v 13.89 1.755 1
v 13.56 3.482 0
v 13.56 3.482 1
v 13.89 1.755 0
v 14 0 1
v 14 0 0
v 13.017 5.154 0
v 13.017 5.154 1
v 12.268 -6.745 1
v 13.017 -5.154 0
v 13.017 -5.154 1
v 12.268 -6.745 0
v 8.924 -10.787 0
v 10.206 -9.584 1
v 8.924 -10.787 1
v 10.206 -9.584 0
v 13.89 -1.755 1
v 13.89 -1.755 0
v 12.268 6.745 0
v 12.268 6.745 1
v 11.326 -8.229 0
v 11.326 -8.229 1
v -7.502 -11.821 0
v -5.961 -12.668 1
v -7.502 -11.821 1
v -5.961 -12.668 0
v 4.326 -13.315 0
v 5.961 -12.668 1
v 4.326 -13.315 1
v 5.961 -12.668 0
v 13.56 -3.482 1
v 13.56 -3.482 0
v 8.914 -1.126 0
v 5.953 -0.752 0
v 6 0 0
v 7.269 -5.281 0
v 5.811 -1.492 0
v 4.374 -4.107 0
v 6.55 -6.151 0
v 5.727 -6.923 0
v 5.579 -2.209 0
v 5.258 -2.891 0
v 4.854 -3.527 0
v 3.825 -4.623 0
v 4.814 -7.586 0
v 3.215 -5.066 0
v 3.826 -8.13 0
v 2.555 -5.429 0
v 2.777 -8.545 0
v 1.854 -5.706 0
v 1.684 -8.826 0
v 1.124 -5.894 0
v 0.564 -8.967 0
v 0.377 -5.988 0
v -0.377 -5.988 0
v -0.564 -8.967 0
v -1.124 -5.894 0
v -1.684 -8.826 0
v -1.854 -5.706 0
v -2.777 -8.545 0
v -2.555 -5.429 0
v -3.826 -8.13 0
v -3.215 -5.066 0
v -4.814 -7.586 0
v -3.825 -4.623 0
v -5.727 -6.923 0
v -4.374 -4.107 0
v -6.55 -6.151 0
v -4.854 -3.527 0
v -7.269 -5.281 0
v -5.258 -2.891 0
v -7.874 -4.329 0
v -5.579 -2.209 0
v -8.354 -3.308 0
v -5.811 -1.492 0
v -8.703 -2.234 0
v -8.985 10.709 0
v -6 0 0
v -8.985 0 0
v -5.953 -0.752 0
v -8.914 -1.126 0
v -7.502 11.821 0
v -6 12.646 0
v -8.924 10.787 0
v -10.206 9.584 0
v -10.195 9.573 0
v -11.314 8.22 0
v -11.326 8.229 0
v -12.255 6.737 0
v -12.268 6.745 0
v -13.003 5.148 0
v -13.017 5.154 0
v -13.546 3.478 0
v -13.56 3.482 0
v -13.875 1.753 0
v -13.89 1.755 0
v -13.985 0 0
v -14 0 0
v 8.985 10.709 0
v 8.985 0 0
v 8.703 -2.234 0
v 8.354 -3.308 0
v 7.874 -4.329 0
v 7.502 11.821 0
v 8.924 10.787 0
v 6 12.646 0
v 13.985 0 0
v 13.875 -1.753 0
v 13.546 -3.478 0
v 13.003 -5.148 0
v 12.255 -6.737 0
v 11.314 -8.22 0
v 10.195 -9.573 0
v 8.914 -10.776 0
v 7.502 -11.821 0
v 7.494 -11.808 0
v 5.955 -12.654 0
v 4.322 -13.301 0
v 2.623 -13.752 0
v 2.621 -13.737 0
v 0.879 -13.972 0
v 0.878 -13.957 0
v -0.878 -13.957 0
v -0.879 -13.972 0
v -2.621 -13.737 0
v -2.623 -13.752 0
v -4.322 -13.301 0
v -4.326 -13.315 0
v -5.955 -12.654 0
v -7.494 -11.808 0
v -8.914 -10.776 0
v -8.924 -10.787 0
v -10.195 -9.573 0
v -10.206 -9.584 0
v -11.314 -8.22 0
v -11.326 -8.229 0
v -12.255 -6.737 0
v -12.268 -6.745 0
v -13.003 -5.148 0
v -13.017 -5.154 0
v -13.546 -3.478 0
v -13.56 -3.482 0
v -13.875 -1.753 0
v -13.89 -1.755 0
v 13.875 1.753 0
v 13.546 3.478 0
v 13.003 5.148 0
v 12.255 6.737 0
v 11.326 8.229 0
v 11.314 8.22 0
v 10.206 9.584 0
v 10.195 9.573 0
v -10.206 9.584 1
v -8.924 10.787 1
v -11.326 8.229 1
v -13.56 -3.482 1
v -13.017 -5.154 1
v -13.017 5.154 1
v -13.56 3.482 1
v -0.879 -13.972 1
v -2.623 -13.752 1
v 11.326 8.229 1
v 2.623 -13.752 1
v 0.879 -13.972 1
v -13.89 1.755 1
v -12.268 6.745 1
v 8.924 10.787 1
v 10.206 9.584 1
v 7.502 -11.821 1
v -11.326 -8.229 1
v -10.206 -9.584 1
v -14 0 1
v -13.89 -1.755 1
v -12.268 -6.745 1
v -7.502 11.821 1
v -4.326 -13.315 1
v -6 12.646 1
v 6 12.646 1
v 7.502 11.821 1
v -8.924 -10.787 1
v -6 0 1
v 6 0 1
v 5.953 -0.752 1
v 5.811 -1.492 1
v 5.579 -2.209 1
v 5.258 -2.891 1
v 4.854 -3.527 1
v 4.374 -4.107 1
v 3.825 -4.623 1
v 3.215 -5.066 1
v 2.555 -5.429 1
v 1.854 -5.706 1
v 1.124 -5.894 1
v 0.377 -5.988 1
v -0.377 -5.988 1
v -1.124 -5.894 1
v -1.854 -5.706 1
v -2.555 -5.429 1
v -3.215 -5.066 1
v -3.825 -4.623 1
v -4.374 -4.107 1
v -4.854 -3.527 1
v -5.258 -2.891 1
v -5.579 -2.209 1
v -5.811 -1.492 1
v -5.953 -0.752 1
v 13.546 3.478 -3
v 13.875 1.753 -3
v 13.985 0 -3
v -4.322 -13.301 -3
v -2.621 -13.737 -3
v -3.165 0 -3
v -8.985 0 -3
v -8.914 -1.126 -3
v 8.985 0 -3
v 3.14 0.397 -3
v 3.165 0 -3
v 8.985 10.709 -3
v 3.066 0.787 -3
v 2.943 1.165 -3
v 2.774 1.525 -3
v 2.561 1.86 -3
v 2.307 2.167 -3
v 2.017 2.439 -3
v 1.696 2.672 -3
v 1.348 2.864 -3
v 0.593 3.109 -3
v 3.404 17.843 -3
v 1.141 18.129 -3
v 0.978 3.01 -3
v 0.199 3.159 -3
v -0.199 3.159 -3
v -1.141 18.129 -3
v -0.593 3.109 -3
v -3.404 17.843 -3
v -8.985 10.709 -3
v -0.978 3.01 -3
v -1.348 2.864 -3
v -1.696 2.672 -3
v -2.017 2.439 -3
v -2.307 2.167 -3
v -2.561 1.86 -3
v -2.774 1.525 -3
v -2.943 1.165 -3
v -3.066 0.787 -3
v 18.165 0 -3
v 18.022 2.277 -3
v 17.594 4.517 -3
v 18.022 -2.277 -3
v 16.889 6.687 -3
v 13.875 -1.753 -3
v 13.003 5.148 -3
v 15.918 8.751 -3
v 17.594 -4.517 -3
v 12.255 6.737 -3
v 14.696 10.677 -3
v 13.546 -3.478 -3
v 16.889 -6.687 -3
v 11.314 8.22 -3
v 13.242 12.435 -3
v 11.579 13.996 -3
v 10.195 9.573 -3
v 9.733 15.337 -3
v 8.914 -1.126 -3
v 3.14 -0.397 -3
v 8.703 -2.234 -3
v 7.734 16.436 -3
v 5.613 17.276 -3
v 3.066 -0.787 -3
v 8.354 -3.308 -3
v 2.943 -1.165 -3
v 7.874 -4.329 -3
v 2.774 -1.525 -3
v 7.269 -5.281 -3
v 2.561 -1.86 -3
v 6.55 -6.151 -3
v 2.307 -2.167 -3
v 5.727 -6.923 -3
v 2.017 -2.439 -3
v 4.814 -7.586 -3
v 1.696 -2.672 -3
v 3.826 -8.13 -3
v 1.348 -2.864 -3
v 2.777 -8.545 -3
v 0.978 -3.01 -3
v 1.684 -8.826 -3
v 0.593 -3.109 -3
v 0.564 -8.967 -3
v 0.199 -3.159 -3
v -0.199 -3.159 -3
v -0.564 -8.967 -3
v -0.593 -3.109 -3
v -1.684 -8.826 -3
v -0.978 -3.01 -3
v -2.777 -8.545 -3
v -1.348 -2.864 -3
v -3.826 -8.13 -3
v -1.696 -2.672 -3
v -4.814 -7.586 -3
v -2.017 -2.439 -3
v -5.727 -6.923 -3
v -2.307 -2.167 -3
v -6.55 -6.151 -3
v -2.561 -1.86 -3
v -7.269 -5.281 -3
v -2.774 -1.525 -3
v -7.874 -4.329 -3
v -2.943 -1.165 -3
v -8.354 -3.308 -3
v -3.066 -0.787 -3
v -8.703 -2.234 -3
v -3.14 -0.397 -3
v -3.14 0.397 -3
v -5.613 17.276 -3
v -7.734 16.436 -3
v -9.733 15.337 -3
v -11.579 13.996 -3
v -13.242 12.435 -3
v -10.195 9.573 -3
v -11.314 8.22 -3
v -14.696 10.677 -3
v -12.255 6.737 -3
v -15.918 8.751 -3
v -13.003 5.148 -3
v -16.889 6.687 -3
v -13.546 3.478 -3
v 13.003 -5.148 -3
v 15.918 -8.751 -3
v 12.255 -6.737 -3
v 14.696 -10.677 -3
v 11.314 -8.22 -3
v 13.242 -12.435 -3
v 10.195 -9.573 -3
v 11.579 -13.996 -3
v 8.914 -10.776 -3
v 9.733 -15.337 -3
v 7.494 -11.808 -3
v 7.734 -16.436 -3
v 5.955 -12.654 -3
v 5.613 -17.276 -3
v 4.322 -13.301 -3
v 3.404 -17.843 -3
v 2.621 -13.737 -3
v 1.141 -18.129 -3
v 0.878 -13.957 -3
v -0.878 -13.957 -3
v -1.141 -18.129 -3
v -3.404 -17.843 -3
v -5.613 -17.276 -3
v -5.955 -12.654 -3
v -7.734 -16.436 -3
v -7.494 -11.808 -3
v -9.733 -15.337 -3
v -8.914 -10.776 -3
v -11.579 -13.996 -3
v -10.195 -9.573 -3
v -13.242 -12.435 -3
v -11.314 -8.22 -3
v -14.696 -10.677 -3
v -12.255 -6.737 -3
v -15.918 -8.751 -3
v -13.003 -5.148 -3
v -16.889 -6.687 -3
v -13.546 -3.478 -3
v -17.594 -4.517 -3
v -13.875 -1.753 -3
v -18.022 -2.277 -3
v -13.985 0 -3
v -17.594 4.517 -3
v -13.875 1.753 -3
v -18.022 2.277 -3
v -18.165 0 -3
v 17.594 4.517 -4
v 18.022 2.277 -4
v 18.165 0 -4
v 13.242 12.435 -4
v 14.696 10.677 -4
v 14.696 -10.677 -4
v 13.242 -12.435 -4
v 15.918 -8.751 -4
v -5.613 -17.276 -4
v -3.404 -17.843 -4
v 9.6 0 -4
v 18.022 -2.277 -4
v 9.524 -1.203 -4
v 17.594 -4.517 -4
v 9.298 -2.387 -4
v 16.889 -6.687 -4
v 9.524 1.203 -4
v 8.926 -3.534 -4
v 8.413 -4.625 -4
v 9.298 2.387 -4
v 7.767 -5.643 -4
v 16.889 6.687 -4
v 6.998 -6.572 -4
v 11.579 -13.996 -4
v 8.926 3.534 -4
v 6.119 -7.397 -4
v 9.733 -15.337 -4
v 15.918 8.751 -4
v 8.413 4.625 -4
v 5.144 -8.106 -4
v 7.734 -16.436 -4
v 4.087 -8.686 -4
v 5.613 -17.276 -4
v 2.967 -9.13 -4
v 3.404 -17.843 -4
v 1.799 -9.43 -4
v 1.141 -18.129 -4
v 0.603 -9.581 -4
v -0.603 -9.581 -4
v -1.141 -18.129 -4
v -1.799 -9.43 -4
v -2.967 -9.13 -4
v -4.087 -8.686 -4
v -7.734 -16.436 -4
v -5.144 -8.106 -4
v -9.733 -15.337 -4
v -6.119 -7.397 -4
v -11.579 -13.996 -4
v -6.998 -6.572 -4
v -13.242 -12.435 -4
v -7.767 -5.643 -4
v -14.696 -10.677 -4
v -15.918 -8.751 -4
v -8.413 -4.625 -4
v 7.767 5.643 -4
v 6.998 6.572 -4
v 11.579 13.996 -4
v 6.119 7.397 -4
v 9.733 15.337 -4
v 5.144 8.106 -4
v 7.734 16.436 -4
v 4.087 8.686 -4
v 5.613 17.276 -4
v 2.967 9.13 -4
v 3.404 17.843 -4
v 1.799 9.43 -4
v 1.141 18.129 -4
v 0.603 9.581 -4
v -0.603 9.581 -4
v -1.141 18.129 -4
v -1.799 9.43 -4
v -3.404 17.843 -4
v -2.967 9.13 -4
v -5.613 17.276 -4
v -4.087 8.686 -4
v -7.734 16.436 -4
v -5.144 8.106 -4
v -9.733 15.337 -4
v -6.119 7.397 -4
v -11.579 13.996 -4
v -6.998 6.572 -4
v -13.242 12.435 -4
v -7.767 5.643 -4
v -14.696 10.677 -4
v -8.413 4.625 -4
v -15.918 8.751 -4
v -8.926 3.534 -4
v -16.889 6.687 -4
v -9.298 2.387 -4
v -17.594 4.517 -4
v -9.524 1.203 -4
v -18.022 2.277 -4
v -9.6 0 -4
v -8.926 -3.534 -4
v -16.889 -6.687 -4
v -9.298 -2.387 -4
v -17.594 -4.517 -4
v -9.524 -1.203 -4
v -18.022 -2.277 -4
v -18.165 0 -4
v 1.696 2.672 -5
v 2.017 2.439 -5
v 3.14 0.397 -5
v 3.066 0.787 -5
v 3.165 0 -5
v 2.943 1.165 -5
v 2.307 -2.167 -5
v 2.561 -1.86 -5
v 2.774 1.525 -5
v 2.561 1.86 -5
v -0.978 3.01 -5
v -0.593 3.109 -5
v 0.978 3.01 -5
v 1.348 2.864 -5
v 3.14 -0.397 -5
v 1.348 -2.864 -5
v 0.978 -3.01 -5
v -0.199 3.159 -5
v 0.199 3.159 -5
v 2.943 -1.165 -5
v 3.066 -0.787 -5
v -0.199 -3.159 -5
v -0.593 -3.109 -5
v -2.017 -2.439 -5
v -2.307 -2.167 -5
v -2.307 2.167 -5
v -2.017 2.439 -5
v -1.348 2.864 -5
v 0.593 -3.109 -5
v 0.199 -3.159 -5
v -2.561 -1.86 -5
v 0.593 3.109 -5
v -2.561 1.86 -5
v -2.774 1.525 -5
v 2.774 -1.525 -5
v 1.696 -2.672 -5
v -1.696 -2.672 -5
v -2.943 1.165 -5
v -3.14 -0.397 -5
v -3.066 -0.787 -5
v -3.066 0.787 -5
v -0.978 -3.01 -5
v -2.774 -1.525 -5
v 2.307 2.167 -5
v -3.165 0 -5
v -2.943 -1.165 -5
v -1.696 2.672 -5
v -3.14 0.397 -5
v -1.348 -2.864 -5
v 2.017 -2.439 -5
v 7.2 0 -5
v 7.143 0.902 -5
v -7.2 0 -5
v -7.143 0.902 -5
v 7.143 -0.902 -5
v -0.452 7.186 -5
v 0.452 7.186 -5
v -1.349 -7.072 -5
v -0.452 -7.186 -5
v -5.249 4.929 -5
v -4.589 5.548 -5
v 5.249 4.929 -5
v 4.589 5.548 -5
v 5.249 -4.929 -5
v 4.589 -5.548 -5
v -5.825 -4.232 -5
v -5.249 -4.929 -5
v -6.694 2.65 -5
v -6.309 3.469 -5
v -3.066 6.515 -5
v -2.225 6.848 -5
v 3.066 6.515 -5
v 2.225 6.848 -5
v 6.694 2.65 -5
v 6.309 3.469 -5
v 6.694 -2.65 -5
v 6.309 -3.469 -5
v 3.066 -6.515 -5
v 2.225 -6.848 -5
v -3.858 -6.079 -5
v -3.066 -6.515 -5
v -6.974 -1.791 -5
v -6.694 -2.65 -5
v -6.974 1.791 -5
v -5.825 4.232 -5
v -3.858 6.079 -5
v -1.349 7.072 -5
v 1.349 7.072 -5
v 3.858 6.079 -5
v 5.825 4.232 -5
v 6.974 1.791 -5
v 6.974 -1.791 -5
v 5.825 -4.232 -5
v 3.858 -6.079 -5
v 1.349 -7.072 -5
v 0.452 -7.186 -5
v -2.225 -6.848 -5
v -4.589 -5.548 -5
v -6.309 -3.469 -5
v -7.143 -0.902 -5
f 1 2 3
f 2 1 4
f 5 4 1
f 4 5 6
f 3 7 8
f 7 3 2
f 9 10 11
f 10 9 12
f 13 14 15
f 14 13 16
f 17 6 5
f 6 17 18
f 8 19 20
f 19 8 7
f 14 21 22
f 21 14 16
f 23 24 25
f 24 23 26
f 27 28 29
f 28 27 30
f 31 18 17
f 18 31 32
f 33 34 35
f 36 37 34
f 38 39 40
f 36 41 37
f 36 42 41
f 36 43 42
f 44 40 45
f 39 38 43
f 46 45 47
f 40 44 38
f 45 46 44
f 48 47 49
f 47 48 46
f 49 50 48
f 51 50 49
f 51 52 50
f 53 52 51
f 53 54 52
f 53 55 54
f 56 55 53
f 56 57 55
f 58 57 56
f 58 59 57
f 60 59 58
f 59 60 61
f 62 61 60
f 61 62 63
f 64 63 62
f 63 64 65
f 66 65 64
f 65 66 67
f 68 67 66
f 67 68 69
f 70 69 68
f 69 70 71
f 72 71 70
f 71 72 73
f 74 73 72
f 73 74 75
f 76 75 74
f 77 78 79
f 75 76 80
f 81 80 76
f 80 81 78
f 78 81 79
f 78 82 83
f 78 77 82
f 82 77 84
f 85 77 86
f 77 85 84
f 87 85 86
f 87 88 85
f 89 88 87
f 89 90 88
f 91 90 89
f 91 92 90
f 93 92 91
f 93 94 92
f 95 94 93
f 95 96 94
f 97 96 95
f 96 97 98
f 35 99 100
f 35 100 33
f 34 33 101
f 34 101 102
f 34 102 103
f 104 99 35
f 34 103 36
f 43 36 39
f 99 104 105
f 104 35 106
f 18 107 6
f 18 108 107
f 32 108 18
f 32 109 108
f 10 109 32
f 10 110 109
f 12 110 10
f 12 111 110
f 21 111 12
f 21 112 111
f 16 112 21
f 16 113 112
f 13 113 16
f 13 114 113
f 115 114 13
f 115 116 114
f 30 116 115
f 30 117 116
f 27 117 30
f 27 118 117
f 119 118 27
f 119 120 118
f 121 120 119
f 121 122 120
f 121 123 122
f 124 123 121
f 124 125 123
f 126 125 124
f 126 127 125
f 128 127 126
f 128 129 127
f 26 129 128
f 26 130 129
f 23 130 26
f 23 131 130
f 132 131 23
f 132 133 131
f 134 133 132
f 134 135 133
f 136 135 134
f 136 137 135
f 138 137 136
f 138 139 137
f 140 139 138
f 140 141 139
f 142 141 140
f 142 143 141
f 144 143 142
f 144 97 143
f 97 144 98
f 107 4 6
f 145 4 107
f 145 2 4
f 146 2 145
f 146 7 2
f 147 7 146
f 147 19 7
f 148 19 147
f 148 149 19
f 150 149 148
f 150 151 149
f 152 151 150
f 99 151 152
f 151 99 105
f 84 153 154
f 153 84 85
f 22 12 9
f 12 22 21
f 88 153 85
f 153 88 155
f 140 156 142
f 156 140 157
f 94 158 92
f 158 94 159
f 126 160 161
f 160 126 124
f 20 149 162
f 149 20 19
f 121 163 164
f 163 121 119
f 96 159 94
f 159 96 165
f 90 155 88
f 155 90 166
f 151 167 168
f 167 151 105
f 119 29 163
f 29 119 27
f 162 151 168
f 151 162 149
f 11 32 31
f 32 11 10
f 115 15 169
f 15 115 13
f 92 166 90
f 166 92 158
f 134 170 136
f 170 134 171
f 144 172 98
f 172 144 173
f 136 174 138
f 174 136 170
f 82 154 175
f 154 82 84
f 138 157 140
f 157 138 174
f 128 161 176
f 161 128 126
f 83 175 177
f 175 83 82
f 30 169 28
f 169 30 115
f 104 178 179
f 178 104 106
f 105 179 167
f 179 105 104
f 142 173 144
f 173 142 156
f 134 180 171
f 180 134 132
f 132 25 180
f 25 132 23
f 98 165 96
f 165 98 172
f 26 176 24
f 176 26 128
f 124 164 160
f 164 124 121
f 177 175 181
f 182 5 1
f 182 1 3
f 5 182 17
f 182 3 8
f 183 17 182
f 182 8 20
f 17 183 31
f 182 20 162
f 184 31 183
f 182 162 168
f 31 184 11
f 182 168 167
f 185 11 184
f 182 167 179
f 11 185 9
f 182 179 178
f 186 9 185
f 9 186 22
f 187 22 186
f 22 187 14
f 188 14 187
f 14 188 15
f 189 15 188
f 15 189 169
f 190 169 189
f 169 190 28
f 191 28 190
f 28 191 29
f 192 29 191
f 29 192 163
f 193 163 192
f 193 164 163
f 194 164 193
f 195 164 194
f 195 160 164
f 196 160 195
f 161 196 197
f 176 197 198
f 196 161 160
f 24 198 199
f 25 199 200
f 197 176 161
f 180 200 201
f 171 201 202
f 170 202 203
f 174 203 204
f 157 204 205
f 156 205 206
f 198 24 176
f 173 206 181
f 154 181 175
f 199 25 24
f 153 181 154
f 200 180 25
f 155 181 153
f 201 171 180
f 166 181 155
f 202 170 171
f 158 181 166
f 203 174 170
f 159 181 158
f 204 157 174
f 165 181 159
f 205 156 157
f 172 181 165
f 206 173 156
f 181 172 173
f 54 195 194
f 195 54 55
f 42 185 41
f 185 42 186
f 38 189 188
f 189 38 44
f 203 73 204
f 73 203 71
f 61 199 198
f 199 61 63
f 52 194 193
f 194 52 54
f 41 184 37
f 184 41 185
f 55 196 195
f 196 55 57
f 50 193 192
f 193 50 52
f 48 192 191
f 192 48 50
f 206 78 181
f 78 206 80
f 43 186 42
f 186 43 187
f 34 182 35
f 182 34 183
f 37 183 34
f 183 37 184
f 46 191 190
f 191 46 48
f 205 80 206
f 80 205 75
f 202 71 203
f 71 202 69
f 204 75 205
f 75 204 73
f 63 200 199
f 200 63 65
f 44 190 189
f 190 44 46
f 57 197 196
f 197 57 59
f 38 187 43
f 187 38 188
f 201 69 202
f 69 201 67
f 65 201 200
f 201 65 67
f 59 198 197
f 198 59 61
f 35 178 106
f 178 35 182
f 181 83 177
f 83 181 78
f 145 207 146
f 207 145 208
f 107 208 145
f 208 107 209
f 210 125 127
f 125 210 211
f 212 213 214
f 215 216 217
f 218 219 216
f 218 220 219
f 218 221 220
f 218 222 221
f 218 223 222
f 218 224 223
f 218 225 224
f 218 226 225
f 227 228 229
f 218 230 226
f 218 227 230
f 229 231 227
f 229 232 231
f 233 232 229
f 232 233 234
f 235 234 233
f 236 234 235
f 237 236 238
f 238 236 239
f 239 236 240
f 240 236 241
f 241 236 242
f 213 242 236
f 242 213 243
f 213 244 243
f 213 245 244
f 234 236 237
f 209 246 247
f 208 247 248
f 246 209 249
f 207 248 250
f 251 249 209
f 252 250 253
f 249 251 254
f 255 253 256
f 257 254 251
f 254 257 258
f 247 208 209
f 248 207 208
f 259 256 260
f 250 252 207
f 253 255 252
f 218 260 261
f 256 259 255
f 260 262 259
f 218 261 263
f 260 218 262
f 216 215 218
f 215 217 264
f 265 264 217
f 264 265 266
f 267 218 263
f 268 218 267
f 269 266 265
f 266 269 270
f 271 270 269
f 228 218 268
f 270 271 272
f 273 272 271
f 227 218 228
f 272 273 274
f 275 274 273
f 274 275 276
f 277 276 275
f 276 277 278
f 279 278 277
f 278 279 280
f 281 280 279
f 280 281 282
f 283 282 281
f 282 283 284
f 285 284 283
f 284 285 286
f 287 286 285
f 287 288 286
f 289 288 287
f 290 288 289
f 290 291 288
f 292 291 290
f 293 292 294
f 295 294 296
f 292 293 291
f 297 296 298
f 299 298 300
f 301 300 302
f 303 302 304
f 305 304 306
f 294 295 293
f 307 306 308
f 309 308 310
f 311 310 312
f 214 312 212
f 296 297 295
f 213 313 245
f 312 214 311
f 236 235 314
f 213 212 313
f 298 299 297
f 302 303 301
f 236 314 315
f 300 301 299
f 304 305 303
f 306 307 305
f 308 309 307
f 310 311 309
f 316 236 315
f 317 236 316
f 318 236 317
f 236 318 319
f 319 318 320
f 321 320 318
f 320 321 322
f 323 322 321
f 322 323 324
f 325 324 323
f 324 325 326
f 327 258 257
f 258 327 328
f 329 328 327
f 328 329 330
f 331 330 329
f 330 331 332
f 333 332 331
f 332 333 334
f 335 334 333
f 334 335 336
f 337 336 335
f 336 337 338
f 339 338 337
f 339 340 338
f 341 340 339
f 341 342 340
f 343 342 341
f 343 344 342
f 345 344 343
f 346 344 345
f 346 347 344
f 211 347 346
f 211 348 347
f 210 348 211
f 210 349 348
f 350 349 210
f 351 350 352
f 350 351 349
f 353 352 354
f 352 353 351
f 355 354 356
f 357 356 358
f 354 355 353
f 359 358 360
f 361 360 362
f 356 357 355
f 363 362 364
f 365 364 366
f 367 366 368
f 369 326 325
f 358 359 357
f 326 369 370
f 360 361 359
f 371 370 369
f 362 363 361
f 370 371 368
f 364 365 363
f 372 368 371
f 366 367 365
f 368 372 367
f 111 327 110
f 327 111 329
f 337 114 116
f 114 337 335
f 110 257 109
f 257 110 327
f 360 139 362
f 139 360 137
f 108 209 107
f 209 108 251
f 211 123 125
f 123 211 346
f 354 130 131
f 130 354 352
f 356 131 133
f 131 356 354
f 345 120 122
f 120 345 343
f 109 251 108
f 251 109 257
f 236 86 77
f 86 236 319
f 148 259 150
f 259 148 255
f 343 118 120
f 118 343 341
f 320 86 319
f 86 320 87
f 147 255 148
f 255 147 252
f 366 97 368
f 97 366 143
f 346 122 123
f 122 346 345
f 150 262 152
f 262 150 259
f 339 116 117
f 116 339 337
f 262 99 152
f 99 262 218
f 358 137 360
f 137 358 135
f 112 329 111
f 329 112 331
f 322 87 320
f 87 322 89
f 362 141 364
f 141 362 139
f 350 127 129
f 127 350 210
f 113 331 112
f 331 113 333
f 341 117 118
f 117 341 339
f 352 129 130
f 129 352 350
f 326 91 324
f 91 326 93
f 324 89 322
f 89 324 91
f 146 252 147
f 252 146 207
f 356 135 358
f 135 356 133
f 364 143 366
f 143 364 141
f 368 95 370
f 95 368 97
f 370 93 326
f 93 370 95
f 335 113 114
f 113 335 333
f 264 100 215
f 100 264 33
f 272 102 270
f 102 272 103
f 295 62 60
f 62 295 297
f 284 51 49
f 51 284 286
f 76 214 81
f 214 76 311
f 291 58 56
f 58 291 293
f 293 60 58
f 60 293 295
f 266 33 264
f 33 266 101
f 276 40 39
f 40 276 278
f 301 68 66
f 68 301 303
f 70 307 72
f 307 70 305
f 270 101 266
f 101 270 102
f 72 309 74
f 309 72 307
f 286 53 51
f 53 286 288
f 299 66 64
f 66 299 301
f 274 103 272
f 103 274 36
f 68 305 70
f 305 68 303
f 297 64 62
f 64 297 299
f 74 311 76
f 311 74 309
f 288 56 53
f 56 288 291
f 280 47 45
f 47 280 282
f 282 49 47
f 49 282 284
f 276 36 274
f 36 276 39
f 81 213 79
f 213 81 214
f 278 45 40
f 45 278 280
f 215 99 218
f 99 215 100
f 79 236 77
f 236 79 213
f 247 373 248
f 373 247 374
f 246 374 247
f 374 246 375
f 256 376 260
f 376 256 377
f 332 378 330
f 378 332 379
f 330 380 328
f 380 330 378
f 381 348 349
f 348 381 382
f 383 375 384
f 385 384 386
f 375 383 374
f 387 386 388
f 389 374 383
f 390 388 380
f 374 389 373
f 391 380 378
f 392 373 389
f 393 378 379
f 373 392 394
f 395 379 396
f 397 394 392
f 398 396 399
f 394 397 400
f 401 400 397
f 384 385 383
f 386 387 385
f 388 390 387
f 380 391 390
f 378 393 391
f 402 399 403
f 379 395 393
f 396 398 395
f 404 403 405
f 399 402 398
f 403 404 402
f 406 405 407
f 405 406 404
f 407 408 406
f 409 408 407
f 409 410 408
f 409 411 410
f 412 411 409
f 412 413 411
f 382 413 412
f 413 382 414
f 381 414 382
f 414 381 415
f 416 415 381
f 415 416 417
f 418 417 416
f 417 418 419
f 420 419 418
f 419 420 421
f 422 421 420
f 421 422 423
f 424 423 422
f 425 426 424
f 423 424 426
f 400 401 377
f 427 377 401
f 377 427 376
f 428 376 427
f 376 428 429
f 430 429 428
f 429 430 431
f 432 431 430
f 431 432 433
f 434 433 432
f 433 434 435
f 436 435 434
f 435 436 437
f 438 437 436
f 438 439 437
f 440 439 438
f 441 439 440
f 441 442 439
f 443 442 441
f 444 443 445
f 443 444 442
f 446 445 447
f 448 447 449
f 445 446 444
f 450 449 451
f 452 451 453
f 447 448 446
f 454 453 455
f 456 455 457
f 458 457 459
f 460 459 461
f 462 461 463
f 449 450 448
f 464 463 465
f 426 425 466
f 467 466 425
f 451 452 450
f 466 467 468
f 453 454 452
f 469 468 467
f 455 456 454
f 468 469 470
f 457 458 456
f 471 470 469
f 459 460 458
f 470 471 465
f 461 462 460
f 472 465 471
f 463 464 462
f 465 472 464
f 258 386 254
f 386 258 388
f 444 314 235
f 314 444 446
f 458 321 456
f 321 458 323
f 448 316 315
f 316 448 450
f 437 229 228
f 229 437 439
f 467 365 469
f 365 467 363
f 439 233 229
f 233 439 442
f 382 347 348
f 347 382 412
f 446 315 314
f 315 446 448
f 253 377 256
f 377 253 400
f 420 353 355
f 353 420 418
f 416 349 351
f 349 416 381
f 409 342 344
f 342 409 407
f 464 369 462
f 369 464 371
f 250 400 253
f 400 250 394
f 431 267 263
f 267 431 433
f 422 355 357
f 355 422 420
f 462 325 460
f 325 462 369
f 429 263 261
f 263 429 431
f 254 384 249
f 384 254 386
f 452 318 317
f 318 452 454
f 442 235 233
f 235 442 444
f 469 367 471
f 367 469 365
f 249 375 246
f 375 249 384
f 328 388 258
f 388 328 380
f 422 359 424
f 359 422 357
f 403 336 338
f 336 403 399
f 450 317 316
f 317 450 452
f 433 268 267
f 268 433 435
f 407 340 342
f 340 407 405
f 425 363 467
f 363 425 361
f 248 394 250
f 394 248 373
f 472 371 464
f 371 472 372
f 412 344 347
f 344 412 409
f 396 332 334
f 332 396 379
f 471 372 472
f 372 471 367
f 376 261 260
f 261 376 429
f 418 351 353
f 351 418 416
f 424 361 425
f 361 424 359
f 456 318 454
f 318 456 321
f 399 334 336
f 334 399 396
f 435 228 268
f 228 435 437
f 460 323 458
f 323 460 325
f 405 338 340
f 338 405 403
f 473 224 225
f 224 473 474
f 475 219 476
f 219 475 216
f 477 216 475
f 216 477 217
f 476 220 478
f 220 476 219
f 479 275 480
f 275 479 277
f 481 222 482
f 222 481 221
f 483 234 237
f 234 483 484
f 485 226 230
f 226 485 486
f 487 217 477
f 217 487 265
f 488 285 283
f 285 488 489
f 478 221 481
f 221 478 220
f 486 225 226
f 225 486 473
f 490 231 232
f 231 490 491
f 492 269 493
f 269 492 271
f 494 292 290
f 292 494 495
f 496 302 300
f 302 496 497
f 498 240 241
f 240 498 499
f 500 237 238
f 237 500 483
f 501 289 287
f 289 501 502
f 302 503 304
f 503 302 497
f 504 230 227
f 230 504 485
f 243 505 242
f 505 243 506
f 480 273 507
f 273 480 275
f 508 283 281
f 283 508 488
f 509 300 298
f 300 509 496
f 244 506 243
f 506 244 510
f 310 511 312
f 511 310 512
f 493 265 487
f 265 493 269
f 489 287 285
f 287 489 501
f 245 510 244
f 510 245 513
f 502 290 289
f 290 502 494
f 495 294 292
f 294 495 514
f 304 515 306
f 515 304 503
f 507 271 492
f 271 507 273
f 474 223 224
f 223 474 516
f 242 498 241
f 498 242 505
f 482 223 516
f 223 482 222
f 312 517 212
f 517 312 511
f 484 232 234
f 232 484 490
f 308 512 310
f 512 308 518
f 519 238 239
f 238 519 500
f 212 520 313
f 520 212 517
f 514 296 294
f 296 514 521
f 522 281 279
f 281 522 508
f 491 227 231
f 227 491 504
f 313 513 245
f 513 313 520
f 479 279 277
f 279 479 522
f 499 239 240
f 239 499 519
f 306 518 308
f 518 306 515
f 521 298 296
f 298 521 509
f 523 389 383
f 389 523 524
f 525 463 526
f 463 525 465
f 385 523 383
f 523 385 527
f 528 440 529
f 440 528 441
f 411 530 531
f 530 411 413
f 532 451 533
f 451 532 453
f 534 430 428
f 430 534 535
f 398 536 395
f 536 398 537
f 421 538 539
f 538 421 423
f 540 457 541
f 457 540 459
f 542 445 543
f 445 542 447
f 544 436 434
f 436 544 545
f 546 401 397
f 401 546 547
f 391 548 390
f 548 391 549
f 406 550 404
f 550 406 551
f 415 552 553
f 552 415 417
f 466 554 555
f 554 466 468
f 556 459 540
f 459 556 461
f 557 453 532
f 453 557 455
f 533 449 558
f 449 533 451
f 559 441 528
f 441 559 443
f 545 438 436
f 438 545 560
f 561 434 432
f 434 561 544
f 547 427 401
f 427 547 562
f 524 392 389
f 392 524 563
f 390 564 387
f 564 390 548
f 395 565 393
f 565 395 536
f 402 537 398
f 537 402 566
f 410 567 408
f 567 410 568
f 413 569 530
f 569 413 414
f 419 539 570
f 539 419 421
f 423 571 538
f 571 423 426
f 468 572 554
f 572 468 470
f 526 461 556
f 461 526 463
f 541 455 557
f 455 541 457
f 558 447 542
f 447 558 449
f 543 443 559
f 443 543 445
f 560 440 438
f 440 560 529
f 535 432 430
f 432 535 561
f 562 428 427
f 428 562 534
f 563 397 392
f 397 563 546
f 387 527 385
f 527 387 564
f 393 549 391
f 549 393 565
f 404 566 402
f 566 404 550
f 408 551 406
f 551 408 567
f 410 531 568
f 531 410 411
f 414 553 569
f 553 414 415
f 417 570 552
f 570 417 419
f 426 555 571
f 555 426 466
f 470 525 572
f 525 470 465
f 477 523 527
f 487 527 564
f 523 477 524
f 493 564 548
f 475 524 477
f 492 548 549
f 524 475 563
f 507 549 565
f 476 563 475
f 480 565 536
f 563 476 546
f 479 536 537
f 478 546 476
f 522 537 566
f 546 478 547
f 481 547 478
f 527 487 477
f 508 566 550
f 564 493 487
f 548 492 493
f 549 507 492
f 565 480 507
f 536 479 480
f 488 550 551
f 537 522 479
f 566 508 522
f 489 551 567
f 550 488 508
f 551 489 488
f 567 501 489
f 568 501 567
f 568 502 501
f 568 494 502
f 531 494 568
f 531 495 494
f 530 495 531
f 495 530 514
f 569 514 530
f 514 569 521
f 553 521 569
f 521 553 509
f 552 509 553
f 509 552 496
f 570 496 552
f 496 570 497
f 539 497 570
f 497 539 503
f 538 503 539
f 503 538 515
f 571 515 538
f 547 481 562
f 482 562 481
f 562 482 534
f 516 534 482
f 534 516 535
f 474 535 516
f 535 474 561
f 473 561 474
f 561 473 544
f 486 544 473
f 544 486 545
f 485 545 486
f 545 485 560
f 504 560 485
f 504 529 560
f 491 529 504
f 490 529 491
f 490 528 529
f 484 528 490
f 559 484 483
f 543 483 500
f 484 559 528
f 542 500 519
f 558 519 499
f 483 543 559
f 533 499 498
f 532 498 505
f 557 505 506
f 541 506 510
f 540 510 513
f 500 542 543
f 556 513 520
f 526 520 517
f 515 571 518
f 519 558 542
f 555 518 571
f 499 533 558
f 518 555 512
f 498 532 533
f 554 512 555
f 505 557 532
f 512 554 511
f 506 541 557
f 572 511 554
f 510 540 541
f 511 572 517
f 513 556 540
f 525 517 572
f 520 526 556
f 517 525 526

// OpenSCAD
// file: manifold_parts.scad
module tube(height, radius, wall){
  difference(){
    cylinder(h=height, r=radius + wall);
    translate([0, 0, -1])
    cylinder(h=height+2, r=radius);
  }		
}

module washer(or, ir, h){
  tube(h, ir, or-ir);
}

module elb(radius, wall){
  d = 2 * (radius + wall);
  difference(){
    tube(sqrt(2) * (d), radius, wall);
    translate([radius + wall, -d, 0])rotate(45, [0, -1, 0])cube([d, 2*d, 2*d]);
  }
}

module elbow(radius, wall){
  union(){
    elb(radius, wall);
    translate([radius+wall, 0, radius + wall])
      rotate(90, [0, -1, 0])
      rotate(180, [0, 0, 1])
      elb(radius, wall);
  }
}

module tee(r1, r2, wall){
  difference(){
    union(){
      cylinder(h=(r2 + wall), r=r1+wall);
      translate([(r1 + wall), 0, (r2 + wall)])
	rotate(90, [0, -1, 0])
	cylinder(h=2*(r1 + wall), r=r2+wall);
    }
    translate([0, 0, -1])
    cylinder(h=(r2 + wall)+2, r=r1);
    translate([(r1 + wall), 0, (r2 + wall)])
      rotate(90, [0, -1, 0])
      translate([0, 0, -1])
      cylinder(h=2*(r1 + wall)+1, r=r2);
  }
}

module taper(r1, r2, h, wall){
  difference(){
    cylinder(r1=r1+wall, r2=r2+wall, h=h);
    cylinder(r1=r1, r2=r2, h=h);
  }
}

module eks(r1, r2, wall){
  difference(){
    union(){
      cylinder(h=2*(r2 + wall), r=r1+wall);
      translate([(r1 + wall), 0, (r2 + wall)])

	rotate(90, [0, -1, 0])
	cylinder(h=2*(r1 + wall), r=r2+wall);
    }
    cylinder(h=2*(r2 + wall), r=r1);
    translate([(r1 + wall), 0, (r2 + wall)])
    rotate(90, [0, -1, 0])
      cylinder(h=2*(r1 + wall), r=r2);
  }
}

/*
  r1 -- main tube inside radius 
  r2 -- fattest part barb inside radius
  h1 -- total height
  h2 -- height of barb
  h3 -- offset from top to start of barb
 */
module barb(r1, r2, h1, h2, h3, wall){
  union(){
    tube(h1, r1, wall);
    translate([0, 0, h1 - h2 - h3])
      taper(r2, r1, h2, wall);
  }
}
// main file
include <manifold_parts.scad>

$fn = 50;

scale = 1.;
inch = 25.4 * scale;
mm = 1. * scale;
wall = .05 * inch;
radius = .5*inch;
or = wall + radius;
gap = .25*inch;
gap = 0.02 * inch;
/*tee(radius * .5, radius, wall);*/

w=1.4*mm;
chuck_thickness = 0.6*inch;
cuff_clearance = 5*mm;

// female
/*
translate([0, 0*.5*inch, .8*inch-3*mm])
scale(1/scale){
  difference(){
    tube(7*mm, 1*mm, w); // manifold-connect
    translate([0, 0, 6.25*mm])
    difference(){
      cylinder(h=1*mm + w, r1=1.1*mm + w, r2=1.1*mm+w);
      translate([0,0,-1*mm])
	cylinder(h=2*mm + w, r1=2*mm + w, r2=0.0*mm);
    }
  }
  translate([0, 0, -5 * mm])
  union(){
    taper(5.75*mm/2, 2*mm, 5*mm, w);
    tube(3*mm, 2*mm, w);
    translate([0, 0, -12.34 * mm])
      union(){
	tube(12.34 * mm, 5.75*mm/2, w);
	translate([0, 0, -3*mm])
	  tube(3*mm, 8.33*mm/2, 4.82*mm); // panel mount
	//translate([0, 0, -4.0*mm])
	  //color("blue")
	  //tube(1*mm, 6.33*mm/2, 5.82*mm); // o-ring holder
	
    }
  }
}
*/
x = 2*(8.33*mm/2 + 4.82*mm);

module flange_mount(){
  difference(){
    color([0, 1, 0, 1])
      tube(1*mm, 6*mm, 8*mm);
    translate([-6*mm, 0, -.1])
      cube([12*mm, 20*mm, 3.1*mm]);
  }
  translate([0, 0, -3*mm]){
    difference(){
      color("blue")
	tube(3.05*mm, 8.33*mm/2 + 4.82*mm, 5*mm); // panel mount
      translate([-x/2, 0, 0])
	cube([x, 20*mm, 3.1*mm]);
    }
  
    translate([0, 0, -1*mm])
      color("green")
      tube(1*mm, 6.33*mm/2, 15*mm); // panel mount
    translate([0, 0, -5*mm])
      difference(){
      cylinder(h=5*mm, r1=0*mm, r2=12*mm);
      cube([15*mm, 15*mm, 6*mm], center=true);
      cylinder(h=6*mm, r=6.33*mm/2);
    }
  }
}

flange_mount();
